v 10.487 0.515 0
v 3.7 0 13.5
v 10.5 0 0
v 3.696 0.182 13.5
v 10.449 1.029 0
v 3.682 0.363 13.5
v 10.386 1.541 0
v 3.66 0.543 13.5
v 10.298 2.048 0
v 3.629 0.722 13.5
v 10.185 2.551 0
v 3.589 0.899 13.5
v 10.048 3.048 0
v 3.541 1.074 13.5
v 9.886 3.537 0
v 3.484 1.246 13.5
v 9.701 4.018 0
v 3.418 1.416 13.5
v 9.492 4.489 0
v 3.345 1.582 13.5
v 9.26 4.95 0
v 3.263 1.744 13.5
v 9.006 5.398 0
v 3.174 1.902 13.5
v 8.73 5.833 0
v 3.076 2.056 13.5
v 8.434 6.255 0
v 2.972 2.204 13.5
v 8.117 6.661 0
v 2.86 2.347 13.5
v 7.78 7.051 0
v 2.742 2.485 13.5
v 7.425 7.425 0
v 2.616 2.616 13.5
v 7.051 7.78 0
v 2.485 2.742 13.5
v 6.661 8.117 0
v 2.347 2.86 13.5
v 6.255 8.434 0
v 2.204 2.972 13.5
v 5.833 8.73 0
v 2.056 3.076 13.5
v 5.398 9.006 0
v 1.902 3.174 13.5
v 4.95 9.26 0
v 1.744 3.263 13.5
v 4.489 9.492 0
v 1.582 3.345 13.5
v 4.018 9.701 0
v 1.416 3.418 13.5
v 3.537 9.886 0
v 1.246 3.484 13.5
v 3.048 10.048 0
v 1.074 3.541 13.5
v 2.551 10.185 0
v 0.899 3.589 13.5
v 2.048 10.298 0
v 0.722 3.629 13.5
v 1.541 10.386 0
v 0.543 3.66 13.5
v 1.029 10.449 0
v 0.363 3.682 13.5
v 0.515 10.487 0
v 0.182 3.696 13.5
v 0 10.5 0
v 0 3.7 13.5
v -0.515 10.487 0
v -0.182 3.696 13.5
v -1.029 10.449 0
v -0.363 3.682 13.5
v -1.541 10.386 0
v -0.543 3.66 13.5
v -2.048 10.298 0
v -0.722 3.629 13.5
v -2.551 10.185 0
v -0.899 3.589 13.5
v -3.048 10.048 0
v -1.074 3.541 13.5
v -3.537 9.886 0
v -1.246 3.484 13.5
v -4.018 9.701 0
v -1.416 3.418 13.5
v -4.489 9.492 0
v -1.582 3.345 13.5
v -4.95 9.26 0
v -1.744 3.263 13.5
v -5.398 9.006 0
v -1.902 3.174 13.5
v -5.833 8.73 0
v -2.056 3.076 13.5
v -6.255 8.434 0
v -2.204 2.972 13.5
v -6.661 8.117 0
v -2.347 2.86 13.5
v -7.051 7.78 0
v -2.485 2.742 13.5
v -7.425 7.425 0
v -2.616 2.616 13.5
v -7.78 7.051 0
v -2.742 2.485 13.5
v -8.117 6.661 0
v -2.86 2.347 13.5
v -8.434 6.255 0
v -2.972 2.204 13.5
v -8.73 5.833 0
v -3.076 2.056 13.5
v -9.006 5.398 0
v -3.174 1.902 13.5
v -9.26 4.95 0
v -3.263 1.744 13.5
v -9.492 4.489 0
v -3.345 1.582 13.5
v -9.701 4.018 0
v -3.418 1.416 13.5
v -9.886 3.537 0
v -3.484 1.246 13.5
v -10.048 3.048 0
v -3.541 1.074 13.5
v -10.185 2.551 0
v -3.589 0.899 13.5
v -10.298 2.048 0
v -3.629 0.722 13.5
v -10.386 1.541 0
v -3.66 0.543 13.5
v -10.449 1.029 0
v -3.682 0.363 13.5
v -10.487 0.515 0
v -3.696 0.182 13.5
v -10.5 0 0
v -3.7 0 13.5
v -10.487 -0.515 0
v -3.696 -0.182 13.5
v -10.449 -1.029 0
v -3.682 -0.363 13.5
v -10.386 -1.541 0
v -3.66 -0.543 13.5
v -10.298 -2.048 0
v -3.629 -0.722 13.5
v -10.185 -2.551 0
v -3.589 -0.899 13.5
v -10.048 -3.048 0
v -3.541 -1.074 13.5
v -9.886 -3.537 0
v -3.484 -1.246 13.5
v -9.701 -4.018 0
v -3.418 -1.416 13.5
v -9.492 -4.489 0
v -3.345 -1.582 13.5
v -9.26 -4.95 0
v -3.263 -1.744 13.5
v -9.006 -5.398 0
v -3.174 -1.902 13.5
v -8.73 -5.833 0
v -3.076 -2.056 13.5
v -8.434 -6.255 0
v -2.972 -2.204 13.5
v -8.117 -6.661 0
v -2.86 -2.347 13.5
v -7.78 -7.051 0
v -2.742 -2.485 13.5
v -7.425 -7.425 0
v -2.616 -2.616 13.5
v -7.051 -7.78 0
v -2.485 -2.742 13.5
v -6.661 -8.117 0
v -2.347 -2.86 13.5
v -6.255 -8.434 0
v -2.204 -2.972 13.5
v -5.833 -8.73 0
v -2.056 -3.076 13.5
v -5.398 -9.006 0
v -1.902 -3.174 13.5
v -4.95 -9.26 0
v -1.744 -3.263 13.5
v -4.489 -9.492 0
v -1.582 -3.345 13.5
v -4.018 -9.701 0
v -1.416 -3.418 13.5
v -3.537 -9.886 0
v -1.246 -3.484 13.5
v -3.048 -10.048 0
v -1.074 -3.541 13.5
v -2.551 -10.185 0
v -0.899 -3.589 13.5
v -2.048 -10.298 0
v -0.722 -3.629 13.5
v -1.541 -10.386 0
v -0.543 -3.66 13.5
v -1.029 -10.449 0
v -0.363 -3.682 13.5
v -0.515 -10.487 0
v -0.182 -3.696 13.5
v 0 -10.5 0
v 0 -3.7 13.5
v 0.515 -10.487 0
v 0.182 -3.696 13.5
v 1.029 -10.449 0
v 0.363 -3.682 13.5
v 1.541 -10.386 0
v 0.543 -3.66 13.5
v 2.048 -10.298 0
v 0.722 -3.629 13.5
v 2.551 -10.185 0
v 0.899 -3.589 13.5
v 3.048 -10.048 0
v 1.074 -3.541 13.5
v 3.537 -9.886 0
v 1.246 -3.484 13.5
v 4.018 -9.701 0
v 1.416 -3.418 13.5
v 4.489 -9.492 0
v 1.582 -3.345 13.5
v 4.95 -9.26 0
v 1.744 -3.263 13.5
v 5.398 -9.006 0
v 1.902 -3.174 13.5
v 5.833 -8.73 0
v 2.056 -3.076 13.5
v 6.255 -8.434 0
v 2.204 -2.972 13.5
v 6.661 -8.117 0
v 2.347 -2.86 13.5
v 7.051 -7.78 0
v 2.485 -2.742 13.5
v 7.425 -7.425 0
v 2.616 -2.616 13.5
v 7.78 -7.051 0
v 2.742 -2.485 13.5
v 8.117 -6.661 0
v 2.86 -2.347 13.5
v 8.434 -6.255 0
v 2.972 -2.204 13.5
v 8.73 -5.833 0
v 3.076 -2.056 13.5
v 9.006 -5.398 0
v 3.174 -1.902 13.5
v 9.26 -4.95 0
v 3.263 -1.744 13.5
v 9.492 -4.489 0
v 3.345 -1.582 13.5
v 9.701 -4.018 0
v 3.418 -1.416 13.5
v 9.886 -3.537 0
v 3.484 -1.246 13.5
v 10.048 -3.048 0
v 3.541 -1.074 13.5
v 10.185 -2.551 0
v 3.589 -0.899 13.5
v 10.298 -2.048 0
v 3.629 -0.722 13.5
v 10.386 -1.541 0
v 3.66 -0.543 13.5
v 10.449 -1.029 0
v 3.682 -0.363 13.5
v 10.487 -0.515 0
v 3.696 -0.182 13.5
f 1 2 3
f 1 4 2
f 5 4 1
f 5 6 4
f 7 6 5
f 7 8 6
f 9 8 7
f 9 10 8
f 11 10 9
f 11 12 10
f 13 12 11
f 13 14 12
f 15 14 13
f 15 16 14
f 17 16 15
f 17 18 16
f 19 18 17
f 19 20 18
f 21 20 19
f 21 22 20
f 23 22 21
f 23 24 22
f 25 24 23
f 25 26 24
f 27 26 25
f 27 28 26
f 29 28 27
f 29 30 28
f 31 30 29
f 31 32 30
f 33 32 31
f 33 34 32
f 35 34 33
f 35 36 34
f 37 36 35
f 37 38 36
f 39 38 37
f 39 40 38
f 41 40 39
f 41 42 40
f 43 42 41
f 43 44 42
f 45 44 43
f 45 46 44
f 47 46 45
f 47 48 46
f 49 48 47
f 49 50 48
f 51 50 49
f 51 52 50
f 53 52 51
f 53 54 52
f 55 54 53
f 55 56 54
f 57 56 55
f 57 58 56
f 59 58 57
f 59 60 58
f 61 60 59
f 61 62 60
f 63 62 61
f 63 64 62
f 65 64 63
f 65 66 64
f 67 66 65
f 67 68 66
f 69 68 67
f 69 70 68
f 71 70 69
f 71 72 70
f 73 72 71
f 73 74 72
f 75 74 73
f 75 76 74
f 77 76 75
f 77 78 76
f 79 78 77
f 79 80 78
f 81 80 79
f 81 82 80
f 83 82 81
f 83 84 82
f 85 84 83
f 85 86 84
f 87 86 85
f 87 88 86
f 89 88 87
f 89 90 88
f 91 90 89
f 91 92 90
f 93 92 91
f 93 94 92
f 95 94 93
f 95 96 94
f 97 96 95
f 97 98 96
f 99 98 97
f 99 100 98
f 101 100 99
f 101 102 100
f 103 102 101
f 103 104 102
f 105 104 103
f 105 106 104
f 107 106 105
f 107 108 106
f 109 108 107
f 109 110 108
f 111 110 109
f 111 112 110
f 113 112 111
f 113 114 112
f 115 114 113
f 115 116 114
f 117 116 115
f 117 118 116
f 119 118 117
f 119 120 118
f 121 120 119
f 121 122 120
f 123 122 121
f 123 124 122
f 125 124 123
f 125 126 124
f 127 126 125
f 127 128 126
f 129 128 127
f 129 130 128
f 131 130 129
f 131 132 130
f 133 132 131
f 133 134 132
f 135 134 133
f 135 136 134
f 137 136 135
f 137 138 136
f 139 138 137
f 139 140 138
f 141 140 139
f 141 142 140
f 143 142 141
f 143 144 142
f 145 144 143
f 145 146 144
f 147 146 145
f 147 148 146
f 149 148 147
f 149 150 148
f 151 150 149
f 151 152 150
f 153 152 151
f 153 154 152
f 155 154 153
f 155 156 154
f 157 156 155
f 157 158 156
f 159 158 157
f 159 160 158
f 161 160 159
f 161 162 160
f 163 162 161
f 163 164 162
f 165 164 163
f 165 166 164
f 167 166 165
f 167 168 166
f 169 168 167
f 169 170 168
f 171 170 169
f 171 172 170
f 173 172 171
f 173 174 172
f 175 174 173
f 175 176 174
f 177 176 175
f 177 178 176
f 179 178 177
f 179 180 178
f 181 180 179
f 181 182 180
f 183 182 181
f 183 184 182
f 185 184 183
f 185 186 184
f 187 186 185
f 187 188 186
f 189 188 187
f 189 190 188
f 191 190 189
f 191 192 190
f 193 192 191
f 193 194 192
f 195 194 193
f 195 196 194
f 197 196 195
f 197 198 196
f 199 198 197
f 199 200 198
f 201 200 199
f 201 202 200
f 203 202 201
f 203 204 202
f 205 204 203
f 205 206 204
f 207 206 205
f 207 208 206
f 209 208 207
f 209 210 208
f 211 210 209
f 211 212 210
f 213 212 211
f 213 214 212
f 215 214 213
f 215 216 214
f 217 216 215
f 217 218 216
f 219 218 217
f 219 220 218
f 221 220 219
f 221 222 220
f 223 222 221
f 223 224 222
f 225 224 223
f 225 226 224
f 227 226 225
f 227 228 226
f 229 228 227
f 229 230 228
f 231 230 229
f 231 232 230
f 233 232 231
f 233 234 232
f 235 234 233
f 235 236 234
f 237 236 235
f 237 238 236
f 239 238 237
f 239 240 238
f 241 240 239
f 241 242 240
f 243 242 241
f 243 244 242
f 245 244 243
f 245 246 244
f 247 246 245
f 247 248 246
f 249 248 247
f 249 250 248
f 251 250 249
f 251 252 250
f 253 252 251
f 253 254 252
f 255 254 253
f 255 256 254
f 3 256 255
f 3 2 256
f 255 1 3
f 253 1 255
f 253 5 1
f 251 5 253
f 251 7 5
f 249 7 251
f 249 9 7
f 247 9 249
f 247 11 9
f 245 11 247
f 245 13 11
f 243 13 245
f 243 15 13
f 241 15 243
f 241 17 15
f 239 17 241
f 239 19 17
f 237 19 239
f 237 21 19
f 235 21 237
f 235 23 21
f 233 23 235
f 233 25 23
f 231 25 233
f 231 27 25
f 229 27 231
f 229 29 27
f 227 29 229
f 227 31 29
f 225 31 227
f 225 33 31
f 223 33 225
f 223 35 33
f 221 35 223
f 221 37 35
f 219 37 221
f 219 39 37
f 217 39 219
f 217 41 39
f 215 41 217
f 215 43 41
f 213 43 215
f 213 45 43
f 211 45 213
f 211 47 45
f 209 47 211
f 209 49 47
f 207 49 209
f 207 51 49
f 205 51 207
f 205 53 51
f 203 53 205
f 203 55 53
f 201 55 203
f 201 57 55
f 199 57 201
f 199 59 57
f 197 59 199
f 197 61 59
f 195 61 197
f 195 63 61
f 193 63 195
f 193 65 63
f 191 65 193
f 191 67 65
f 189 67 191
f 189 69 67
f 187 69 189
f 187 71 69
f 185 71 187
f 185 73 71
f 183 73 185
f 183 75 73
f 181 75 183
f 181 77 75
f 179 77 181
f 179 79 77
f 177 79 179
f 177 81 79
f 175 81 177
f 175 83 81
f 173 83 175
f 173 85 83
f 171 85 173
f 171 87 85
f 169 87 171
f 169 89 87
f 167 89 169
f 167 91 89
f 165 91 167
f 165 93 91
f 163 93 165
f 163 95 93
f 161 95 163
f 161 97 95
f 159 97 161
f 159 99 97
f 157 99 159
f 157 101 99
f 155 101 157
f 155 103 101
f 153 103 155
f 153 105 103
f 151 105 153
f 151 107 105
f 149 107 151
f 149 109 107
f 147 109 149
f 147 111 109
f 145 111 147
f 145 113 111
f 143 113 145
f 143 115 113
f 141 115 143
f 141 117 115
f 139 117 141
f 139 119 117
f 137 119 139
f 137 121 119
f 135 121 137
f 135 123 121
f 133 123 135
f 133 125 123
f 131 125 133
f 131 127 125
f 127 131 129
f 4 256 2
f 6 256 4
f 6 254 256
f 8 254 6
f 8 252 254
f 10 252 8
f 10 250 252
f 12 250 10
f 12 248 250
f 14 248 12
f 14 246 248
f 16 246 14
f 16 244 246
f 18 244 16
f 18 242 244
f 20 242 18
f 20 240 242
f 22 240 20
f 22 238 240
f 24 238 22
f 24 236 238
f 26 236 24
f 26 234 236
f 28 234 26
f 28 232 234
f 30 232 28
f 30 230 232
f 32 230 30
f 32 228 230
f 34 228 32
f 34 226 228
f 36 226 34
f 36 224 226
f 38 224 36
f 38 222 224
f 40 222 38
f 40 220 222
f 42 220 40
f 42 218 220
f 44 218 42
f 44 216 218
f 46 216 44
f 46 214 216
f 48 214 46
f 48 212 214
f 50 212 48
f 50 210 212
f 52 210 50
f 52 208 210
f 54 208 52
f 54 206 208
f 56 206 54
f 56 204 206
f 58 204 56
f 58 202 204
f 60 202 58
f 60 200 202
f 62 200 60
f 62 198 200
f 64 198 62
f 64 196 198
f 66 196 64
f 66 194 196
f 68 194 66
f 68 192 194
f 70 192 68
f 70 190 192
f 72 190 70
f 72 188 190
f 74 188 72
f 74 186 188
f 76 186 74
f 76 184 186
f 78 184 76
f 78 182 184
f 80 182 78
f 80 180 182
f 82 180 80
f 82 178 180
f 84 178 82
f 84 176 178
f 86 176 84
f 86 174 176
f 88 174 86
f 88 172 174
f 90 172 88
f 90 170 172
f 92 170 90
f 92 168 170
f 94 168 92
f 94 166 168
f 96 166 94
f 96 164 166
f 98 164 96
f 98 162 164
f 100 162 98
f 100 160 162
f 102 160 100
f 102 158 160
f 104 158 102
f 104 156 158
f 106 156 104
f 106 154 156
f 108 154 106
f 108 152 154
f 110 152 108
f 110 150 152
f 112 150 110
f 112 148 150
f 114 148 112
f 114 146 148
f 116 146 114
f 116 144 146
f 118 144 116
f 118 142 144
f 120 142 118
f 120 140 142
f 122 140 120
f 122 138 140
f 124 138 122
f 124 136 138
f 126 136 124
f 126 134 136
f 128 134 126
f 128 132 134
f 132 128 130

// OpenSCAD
$fn = 128;

r1 = 10.5;
r2 = 3.7;
h  = 13.5;

cylinder(h = h, r1 = r1, r2 = r2, center = false);
